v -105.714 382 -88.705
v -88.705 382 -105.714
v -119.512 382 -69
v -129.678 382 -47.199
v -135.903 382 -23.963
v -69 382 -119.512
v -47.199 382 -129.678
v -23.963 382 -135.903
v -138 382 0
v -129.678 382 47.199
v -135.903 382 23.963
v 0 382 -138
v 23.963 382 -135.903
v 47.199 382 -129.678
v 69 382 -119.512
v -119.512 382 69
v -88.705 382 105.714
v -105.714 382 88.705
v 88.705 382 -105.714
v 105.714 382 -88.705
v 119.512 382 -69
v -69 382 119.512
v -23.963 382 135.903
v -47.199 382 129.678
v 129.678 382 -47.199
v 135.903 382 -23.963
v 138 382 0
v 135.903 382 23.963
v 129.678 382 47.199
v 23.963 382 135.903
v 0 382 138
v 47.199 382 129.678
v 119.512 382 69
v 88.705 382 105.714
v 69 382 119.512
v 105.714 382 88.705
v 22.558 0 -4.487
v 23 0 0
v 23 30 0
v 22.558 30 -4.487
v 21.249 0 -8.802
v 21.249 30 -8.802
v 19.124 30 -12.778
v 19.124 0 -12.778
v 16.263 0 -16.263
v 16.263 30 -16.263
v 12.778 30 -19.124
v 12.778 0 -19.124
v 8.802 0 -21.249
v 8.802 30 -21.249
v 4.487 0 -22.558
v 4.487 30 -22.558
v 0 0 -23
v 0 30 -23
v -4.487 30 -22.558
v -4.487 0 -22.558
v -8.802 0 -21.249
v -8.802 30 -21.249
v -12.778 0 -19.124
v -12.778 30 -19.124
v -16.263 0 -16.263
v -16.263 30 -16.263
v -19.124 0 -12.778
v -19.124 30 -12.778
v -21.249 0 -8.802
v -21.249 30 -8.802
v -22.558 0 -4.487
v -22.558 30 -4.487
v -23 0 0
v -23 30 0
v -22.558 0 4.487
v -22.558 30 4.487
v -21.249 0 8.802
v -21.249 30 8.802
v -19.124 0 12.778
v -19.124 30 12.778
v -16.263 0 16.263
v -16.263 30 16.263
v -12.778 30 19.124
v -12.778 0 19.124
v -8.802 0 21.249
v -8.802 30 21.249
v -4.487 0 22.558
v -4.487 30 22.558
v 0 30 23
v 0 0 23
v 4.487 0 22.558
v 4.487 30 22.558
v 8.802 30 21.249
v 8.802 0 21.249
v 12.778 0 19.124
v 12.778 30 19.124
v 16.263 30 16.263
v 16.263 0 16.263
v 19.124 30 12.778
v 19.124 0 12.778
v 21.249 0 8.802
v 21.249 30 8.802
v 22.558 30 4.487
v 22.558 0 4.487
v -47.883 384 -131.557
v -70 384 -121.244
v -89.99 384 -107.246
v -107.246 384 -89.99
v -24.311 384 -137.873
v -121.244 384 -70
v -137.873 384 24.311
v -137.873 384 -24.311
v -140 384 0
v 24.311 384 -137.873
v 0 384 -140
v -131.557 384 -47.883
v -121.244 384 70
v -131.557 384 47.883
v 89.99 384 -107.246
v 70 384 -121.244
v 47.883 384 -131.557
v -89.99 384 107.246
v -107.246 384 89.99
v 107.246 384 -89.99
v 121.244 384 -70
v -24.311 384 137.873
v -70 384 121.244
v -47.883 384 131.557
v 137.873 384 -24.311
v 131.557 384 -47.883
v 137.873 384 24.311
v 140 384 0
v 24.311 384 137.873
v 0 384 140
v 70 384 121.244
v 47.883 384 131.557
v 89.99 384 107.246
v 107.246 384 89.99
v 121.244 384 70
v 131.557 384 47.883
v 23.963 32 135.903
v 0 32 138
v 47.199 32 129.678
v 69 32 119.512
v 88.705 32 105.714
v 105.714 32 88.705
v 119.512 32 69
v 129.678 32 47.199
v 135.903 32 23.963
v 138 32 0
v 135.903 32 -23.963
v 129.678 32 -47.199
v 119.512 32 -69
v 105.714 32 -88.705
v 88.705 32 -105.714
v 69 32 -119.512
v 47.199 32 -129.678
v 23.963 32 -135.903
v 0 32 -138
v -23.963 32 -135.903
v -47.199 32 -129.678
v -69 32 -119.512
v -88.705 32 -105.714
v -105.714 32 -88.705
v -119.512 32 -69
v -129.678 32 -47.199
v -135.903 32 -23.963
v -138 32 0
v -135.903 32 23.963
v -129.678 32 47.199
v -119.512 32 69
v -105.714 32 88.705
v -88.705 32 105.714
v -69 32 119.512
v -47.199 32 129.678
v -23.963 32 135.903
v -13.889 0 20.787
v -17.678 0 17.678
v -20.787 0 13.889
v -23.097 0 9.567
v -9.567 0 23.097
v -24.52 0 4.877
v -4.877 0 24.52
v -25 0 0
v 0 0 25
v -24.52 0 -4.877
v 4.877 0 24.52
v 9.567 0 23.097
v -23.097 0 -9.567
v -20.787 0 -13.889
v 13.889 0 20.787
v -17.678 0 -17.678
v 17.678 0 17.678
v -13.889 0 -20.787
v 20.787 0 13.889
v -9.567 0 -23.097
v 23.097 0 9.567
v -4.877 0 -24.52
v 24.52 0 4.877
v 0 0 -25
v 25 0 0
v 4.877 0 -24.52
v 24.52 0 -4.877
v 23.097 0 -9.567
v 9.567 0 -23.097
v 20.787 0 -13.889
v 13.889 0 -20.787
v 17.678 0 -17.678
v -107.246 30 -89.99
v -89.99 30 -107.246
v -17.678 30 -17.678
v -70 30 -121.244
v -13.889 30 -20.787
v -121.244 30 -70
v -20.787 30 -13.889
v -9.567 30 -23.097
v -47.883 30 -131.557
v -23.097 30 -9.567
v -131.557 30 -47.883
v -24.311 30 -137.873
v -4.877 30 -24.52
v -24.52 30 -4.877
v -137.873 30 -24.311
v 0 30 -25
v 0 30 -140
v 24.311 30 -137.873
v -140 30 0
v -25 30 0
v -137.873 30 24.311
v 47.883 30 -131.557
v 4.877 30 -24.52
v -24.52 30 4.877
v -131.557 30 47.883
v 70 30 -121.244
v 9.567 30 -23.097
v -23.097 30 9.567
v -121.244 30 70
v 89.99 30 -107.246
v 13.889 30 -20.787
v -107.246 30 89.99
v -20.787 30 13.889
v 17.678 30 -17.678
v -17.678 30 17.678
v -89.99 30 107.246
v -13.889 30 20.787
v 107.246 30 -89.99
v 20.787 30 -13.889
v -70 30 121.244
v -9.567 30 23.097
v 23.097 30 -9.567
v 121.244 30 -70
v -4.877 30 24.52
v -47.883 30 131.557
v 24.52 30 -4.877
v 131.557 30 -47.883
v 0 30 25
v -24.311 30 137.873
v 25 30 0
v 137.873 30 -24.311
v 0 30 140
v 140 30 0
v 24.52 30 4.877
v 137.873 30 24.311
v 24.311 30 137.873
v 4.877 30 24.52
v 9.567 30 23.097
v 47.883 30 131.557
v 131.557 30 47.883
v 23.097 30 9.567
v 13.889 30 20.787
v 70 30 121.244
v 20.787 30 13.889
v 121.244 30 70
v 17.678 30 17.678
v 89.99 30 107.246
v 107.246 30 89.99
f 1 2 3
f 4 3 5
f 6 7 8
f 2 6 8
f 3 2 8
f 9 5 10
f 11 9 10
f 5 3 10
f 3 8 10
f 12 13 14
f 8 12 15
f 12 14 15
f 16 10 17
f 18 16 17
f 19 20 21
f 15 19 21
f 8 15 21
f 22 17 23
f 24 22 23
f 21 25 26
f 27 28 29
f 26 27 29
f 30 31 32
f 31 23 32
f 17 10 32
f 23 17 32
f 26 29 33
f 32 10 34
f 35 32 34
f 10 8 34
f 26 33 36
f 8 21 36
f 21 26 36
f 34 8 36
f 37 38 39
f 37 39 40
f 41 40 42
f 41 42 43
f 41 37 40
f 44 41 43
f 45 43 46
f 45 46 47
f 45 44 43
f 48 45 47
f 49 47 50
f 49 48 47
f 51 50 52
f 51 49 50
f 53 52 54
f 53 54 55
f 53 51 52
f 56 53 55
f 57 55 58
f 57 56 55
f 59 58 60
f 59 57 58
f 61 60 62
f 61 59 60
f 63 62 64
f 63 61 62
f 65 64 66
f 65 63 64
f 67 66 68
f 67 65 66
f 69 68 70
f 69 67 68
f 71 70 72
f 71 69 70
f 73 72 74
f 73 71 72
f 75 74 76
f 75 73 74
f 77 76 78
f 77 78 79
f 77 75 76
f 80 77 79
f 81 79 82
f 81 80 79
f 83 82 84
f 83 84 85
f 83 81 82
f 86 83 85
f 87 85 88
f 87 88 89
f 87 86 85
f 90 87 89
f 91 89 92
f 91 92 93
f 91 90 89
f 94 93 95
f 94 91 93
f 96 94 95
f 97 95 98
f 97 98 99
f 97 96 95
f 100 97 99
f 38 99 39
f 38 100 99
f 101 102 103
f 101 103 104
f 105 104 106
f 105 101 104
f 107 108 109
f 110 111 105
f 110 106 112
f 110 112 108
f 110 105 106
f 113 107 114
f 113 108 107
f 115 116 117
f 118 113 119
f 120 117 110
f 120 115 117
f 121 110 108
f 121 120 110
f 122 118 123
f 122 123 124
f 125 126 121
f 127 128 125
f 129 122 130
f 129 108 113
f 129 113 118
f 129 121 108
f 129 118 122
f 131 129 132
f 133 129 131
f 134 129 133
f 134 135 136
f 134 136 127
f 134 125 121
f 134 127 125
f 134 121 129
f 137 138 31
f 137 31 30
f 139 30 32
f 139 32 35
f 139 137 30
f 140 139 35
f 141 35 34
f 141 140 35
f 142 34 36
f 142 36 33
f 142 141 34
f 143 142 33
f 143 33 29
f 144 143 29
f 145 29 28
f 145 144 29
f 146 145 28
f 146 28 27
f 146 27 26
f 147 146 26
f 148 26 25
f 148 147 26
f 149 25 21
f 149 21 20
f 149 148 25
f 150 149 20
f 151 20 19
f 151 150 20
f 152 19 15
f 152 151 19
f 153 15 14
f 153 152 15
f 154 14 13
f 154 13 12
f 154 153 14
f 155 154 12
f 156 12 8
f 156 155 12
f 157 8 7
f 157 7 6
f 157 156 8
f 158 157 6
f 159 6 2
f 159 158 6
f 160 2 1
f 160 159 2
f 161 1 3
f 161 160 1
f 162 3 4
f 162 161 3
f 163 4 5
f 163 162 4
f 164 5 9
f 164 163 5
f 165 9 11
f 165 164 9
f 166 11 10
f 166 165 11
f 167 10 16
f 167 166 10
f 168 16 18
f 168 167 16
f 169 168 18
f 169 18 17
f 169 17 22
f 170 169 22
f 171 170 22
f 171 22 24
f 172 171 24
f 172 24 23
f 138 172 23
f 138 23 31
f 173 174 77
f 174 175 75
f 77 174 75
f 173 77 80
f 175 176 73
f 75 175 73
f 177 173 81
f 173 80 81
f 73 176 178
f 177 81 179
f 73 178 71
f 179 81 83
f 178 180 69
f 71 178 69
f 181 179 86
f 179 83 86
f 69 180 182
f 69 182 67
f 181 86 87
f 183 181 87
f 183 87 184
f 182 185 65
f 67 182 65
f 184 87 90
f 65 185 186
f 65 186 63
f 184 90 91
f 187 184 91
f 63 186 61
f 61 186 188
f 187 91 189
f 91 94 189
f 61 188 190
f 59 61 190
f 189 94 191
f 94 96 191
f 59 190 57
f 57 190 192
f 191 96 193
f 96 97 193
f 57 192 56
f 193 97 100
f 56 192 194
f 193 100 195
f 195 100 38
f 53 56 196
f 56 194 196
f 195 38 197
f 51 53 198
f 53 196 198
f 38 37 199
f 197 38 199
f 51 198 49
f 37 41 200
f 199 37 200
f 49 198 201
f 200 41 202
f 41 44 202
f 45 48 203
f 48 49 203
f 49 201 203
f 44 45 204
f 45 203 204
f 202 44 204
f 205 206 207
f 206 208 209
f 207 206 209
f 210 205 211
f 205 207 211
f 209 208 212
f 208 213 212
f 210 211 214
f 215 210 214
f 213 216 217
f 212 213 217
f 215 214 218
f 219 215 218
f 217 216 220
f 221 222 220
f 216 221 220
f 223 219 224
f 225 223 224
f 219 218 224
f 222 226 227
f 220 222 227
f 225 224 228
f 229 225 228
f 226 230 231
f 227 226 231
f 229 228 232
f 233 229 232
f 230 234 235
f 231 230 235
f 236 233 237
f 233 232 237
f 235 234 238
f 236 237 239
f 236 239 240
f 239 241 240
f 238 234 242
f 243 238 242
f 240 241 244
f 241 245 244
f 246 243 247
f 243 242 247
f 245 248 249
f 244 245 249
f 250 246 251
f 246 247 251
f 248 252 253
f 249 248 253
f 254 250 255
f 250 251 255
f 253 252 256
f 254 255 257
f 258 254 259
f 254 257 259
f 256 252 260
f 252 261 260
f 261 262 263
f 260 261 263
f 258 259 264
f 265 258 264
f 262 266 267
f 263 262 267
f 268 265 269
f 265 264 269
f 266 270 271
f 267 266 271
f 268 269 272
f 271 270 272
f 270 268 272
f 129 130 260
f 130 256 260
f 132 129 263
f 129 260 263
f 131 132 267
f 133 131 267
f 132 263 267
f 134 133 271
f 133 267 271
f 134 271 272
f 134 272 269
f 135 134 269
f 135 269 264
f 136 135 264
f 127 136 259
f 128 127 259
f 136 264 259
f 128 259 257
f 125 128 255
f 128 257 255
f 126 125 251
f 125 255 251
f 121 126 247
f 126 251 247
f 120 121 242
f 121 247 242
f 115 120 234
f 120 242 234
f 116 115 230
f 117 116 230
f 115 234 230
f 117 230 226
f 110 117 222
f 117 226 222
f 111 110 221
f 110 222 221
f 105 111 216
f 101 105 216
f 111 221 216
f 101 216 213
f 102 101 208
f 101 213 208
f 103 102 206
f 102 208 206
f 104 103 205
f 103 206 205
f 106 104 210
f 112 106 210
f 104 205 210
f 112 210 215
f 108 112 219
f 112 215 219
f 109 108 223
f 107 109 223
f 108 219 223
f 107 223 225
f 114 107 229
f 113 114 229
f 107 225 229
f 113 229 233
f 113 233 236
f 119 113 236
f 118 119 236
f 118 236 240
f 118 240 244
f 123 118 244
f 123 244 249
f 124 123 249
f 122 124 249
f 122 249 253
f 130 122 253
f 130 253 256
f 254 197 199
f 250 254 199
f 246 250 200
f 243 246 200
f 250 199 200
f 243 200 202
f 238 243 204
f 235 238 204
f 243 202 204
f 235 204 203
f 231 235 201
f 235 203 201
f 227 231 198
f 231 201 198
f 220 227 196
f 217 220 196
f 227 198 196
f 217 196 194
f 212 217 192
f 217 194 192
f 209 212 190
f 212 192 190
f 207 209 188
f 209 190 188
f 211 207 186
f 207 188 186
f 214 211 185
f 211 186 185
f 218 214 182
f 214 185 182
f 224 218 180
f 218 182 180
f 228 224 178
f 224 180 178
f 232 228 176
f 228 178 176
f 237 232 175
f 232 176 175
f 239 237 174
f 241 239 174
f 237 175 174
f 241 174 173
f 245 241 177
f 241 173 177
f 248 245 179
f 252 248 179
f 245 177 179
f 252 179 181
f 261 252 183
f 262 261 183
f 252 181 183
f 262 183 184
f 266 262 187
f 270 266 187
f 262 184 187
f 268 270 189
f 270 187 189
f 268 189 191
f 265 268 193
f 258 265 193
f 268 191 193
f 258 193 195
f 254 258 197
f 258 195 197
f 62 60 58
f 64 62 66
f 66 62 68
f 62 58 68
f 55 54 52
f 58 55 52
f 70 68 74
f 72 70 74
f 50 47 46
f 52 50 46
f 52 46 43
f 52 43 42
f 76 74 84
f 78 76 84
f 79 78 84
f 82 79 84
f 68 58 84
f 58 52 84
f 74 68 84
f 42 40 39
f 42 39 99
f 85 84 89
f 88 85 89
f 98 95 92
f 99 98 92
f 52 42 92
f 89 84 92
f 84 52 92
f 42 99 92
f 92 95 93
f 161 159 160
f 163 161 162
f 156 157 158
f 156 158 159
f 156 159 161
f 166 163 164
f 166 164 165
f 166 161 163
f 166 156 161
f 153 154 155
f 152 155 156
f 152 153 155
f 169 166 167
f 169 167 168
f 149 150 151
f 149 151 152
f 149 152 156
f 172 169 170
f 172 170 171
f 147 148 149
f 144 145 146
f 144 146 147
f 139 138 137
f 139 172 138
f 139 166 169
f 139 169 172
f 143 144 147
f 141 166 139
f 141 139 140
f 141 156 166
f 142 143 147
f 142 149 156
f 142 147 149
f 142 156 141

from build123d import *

# Parameters (mm, degrees)
SKETCH1_R           = 25
SKETCH1_R_2         = 23
EXTRUDE_THIN1_DEPTH = 30
SKETCH2_R           = 140
BOSS_EXTRUDE1_DEPTH = 2
SKETCH3_R           = 140
SKETCH3_R_2         = 138
BOSS_EXTRUDE2_DEPTH = 350
SKETCH4_R           = 140
BOSS_EXTRUDE3_DEPTH = 2


with BuildPart() as part:
    # Sketch1 → Extrude-Thin1 (new body)
    with BuildSketch(Plane(origin=(0, 0, 0), x_dir=(1, 0, 0), z_dir=(0, 1, 0))):
        Circle(SKETCH1_R)
        Circle(SKETCH1_R_2, mode=Mode.SUBTRACT)
    extrude(amount=EXTRUDE_THIN1_DEPTH)

    # Sketch2 → Boss-Extrude1 (add)
    with BuildSketch(Plane(origin=(0, 30, 0), x_dir=(1, 0, 0), z_dir=(0, 1, 0))):
        with Locations(Location((0, 0, 0), (0, 0, 270))):
            Circle(SKETCH2_R)
    extrude(amount=BOSS_EXTRUDE1_DEPTH)

    # Sketch3 → Boss-Extrude2 (add)
    with BuildSketch(Plane(origin=(0, 32, 0), x_dir=(1, 0, 0), z_dir=(0, 1, 0))):
        with Locations(Location((0, 0, 0), (0, 0, 270))):
            Circle(SKETCH3_R)
        with Locations(Location((0, 0, 0), (0, 0, 270))):
            Circle(SKETCH3_R_2, mode=Mode.SUBTRACT)
    extrude(amount=BOSS_EXTRUDE2_DEPTH)

    # Sketch4 → Boss-Extrude3 (add)
    with BuildSketch(Plane(origin=(0, 382, 0), x_dir=(1, 0, 0), z_dir=(0, 1, 0))):
        with Locations(Location((0, 0, 0), (0, 0, 270))):
            Circle(SKETCH4_R)
    extrude(amount=BOSS_EXTRUDE3_DEPTH)


solid = part.part
